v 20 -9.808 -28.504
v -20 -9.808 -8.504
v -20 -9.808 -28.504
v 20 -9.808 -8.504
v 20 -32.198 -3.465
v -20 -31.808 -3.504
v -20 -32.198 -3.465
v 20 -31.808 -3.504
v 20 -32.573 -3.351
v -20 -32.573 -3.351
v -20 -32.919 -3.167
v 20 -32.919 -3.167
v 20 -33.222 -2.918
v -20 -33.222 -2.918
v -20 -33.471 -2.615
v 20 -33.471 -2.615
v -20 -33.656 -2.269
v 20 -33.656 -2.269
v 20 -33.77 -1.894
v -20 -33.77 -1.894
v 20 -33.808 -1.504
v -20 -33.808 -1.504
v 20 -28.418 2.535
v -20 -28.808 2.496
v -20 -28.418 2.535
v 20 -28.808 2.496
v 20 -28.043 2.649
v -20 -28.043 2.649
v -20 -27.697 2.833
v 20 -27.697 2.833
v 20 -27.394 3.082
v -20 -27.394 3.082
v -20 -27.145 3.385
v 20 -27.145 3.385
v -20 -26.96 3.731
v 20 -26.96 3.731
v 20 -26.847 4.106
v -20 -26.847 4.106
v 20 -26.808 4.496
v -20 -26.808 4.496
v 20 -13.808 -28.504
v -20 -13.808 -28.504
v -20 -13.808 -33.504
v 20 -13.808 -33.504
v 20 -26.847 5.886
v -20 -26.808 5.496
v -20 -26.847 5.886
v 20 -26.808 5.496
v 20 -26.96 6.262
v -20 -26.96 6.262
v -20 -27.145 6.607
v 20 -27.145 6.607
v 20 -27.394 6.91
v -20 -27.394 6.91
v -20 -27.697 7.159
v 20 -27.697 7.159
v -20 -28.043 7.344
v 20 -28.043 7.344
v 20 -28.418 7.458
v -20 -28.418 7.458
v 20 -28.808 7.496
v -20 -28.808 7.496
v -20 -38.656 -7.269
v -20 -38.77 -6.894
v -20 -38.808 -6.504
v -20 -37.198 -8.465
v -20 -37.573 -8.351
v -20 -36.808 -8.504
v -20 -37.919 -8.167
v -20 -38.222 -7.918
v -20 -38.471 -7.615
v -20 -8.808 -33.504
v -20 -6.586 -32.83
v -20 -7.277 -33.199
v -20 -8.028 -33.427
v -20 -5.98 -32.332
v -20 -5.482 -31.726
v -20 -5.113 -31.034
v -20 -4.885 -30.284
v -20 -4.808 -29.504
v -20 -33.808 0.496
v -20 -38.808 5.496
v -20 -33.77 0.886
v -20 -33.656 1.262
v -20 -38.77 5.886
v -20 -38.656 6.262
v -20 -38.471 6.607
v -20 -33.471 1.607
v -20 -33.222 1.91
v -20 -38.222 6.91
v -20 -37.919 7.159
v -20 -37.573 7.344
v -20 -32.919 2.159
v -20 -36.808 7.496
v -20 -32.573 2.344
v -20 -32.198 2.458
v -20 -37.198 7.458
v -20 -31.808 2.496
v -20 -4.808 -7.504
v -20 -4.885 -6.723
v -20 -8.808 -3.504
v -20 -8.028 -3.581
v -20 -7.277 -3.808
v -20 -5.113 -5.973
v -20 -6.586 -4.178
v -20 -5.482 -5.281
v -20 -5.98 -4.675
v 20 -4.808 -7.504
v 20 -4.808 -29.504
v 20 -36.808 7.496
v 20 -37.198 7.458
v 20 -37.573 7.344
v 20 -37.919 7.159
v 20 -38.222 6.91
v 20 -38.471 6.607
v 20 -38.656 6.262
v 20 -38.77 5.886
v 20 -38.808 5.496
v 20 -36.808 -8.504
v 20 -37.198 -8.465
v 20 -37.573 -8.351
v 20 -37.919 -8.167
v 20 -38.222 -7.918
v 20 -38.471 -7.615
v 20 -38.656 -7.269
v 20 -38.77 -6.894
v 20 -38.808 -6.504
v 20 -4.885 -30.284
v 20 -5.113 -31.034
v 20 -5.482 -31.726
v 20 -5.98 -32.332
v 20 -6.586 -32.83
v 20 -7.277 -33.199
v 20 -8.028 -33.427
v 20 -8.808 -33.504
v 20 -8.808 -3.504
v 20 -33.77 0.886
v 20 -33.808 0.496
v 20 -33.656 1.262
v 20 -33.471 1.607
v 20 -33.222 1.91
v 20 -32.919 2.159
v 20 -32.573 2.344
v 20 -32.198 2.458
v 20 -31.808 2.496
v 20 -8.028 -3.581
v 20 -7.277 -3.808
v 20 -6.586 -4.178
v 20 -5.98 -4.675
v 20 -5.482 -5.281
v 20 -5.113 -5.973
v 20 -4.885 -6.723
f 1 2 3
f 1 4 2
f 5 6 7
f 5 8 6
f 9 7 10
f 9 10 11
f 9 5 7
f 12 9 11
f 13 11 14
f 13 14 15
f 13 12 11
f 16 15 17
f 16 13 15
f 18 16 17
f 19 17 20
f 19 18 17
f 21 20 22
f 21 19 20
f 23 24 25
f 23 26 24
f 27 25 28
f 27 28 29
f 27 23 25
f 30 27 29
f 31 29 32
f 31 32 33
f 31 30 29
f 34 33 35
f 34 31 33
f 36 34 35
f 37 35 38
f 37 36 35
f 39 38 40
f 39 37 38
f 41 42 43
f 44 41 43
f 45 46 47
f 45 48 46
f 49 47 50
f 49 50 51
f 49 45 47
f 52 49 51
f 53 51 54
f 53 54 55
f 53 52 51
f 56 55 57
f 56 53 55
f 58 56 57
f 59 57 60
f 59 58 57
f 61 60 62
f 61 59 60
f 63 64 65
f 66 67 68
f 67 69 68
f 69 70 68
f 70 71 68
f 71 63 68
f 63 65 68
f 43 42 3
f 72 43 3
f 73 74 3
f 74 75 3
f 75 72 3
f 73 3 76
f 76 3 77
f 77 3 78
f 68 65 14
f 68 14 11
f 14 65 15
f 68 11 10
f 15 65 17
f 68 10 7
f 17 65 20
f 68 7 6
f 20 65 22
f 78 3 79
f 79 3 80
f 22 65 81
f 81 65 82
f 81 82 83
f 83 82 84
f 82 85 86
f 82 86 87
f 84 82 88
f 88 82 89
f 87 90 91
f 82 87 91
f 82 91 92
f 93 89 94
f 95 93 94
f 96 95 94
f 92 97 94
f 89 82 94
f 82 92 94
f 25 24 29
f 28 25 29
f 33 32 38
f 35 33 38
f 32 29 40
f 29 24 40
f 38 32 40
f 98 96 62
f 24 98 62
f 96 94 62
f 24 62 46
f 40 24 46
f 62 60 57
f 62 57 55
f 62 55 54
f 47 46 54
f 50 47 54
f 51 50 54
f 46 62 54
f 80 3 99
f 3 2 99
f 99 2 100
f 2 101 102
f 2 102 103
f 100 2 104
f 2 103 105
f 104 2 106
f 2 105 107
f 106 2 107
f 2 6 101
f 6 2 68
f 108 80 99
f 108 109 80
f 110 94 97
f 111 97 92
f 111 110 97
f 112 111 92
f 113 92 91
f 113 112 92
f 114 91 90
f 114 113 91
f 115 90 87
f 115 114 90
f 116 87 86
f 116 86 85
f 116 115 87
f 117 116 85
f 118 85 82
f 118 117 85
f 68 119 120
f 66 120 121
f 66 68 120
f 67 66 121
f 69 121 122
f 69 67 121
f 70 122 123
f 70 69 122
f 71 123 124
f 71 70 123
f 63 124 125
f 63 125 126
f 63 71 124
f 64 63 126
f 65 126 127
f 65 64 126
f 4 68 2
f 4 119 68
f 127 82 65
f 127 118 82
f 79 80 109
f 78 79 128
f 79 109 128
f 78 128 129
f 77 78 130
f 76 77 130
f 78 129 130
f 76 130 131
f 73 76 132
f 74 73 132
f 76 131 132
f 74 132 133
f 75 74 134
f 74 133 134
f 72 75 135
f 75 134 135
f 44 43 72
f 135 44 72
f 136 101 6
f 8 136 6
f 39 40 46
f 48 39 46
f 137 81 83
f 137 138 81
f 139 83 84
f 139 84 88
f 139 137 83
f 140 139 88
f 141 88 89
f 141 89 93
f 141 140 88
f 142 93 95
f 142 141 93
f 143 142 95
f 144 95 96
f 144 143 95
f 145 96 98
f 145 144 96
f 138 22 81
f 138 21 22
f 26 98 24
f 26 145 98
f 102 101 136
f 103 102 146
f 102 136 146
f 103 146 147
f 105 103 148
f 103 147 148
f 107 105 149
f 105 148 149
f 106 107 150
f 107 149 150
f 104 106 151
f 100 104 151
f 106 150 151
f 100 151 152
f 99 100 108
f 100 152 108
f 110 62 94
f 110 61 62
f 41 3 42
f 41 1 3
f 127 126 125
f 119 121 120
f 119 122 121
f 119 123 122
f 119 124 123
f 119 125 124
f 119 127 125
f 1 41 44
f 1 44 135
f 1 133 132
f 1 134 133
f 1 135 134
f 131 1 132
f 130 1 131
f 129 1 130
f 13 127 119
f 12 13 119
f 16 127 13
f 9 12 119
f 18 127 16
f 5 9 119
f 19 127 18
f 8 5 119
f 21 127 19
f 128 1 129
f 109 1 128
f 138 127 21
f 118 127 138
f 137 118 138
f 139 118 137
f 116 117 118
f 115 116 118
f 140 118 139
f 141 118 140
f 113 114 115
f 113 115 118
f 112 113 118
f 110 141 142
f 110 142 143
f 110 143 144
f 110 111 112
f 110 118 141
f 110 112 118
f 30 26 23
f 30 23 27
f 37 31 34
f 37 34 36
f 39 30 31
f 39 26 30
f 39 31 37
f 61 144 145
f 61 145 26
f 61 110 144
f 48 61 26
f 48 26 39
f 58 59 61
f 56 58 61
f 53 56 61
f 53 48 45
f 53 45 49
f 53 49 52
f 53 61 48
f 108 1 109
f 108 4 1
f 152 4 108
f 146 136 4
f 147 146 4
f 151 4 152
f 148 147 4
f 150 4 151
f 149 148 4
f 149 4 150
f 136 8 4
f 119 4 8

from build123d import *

# Parameters (mm, degrees)
F1_DEPTH = 20
F2_R     = 4
F3_R     = 4
F4_R     = 2


with BuildPart() as f1:
    # F0 (on Right) → F1 (new body, symmetric)
    with BuildSketch(Plane.YZ):
        Polygon((-9.808125, -28.503724), (-13.808125, -28.503724), (-13.808125, -33.503724), (-4.808125, -33.503724), (-4.808125, -3.503724), (-33.808125, -3.503724), (-33.808125, 2.496276), (-26.808125, 2.496276), (-26.808125, 7.496276), (-38.808125, 7.496276), (-38.808125, -8.503724), (-9.808125, -8.503724), align=None)
    extrude(amount=F1_DEPTH, both=True)

    # F2
    f2_edges = [f1.edges().sort_by_distance(p)[0] for p in [
        (0, -4.808125, -3.503724),
    ]]
    fillet(f2_edges, radius=F2_R)

    # F3
    f3_edges = [f1.edges().sort_by_distance(p)[0] for p in [
        (0, -4.808125, -33.503724),
    ]]
    fillet(f3_edges, radius=F3_R)

    # F4
    f4_edges = [f1.edges().sort_by_distance(p)[0] for p in [
        (0, -33.808125, 2.496276),
        (0, -26.808125, 2.496276),
        (0, -26.808125, 7.496276),
        (0, -38.808125, 7.496276),
        (0, -38.808125, -8.503724),
        (0, -33.808125, -3.503724),
    ]]
    fillet(f4_edges, radius=F4_R)


solid = f1.part
